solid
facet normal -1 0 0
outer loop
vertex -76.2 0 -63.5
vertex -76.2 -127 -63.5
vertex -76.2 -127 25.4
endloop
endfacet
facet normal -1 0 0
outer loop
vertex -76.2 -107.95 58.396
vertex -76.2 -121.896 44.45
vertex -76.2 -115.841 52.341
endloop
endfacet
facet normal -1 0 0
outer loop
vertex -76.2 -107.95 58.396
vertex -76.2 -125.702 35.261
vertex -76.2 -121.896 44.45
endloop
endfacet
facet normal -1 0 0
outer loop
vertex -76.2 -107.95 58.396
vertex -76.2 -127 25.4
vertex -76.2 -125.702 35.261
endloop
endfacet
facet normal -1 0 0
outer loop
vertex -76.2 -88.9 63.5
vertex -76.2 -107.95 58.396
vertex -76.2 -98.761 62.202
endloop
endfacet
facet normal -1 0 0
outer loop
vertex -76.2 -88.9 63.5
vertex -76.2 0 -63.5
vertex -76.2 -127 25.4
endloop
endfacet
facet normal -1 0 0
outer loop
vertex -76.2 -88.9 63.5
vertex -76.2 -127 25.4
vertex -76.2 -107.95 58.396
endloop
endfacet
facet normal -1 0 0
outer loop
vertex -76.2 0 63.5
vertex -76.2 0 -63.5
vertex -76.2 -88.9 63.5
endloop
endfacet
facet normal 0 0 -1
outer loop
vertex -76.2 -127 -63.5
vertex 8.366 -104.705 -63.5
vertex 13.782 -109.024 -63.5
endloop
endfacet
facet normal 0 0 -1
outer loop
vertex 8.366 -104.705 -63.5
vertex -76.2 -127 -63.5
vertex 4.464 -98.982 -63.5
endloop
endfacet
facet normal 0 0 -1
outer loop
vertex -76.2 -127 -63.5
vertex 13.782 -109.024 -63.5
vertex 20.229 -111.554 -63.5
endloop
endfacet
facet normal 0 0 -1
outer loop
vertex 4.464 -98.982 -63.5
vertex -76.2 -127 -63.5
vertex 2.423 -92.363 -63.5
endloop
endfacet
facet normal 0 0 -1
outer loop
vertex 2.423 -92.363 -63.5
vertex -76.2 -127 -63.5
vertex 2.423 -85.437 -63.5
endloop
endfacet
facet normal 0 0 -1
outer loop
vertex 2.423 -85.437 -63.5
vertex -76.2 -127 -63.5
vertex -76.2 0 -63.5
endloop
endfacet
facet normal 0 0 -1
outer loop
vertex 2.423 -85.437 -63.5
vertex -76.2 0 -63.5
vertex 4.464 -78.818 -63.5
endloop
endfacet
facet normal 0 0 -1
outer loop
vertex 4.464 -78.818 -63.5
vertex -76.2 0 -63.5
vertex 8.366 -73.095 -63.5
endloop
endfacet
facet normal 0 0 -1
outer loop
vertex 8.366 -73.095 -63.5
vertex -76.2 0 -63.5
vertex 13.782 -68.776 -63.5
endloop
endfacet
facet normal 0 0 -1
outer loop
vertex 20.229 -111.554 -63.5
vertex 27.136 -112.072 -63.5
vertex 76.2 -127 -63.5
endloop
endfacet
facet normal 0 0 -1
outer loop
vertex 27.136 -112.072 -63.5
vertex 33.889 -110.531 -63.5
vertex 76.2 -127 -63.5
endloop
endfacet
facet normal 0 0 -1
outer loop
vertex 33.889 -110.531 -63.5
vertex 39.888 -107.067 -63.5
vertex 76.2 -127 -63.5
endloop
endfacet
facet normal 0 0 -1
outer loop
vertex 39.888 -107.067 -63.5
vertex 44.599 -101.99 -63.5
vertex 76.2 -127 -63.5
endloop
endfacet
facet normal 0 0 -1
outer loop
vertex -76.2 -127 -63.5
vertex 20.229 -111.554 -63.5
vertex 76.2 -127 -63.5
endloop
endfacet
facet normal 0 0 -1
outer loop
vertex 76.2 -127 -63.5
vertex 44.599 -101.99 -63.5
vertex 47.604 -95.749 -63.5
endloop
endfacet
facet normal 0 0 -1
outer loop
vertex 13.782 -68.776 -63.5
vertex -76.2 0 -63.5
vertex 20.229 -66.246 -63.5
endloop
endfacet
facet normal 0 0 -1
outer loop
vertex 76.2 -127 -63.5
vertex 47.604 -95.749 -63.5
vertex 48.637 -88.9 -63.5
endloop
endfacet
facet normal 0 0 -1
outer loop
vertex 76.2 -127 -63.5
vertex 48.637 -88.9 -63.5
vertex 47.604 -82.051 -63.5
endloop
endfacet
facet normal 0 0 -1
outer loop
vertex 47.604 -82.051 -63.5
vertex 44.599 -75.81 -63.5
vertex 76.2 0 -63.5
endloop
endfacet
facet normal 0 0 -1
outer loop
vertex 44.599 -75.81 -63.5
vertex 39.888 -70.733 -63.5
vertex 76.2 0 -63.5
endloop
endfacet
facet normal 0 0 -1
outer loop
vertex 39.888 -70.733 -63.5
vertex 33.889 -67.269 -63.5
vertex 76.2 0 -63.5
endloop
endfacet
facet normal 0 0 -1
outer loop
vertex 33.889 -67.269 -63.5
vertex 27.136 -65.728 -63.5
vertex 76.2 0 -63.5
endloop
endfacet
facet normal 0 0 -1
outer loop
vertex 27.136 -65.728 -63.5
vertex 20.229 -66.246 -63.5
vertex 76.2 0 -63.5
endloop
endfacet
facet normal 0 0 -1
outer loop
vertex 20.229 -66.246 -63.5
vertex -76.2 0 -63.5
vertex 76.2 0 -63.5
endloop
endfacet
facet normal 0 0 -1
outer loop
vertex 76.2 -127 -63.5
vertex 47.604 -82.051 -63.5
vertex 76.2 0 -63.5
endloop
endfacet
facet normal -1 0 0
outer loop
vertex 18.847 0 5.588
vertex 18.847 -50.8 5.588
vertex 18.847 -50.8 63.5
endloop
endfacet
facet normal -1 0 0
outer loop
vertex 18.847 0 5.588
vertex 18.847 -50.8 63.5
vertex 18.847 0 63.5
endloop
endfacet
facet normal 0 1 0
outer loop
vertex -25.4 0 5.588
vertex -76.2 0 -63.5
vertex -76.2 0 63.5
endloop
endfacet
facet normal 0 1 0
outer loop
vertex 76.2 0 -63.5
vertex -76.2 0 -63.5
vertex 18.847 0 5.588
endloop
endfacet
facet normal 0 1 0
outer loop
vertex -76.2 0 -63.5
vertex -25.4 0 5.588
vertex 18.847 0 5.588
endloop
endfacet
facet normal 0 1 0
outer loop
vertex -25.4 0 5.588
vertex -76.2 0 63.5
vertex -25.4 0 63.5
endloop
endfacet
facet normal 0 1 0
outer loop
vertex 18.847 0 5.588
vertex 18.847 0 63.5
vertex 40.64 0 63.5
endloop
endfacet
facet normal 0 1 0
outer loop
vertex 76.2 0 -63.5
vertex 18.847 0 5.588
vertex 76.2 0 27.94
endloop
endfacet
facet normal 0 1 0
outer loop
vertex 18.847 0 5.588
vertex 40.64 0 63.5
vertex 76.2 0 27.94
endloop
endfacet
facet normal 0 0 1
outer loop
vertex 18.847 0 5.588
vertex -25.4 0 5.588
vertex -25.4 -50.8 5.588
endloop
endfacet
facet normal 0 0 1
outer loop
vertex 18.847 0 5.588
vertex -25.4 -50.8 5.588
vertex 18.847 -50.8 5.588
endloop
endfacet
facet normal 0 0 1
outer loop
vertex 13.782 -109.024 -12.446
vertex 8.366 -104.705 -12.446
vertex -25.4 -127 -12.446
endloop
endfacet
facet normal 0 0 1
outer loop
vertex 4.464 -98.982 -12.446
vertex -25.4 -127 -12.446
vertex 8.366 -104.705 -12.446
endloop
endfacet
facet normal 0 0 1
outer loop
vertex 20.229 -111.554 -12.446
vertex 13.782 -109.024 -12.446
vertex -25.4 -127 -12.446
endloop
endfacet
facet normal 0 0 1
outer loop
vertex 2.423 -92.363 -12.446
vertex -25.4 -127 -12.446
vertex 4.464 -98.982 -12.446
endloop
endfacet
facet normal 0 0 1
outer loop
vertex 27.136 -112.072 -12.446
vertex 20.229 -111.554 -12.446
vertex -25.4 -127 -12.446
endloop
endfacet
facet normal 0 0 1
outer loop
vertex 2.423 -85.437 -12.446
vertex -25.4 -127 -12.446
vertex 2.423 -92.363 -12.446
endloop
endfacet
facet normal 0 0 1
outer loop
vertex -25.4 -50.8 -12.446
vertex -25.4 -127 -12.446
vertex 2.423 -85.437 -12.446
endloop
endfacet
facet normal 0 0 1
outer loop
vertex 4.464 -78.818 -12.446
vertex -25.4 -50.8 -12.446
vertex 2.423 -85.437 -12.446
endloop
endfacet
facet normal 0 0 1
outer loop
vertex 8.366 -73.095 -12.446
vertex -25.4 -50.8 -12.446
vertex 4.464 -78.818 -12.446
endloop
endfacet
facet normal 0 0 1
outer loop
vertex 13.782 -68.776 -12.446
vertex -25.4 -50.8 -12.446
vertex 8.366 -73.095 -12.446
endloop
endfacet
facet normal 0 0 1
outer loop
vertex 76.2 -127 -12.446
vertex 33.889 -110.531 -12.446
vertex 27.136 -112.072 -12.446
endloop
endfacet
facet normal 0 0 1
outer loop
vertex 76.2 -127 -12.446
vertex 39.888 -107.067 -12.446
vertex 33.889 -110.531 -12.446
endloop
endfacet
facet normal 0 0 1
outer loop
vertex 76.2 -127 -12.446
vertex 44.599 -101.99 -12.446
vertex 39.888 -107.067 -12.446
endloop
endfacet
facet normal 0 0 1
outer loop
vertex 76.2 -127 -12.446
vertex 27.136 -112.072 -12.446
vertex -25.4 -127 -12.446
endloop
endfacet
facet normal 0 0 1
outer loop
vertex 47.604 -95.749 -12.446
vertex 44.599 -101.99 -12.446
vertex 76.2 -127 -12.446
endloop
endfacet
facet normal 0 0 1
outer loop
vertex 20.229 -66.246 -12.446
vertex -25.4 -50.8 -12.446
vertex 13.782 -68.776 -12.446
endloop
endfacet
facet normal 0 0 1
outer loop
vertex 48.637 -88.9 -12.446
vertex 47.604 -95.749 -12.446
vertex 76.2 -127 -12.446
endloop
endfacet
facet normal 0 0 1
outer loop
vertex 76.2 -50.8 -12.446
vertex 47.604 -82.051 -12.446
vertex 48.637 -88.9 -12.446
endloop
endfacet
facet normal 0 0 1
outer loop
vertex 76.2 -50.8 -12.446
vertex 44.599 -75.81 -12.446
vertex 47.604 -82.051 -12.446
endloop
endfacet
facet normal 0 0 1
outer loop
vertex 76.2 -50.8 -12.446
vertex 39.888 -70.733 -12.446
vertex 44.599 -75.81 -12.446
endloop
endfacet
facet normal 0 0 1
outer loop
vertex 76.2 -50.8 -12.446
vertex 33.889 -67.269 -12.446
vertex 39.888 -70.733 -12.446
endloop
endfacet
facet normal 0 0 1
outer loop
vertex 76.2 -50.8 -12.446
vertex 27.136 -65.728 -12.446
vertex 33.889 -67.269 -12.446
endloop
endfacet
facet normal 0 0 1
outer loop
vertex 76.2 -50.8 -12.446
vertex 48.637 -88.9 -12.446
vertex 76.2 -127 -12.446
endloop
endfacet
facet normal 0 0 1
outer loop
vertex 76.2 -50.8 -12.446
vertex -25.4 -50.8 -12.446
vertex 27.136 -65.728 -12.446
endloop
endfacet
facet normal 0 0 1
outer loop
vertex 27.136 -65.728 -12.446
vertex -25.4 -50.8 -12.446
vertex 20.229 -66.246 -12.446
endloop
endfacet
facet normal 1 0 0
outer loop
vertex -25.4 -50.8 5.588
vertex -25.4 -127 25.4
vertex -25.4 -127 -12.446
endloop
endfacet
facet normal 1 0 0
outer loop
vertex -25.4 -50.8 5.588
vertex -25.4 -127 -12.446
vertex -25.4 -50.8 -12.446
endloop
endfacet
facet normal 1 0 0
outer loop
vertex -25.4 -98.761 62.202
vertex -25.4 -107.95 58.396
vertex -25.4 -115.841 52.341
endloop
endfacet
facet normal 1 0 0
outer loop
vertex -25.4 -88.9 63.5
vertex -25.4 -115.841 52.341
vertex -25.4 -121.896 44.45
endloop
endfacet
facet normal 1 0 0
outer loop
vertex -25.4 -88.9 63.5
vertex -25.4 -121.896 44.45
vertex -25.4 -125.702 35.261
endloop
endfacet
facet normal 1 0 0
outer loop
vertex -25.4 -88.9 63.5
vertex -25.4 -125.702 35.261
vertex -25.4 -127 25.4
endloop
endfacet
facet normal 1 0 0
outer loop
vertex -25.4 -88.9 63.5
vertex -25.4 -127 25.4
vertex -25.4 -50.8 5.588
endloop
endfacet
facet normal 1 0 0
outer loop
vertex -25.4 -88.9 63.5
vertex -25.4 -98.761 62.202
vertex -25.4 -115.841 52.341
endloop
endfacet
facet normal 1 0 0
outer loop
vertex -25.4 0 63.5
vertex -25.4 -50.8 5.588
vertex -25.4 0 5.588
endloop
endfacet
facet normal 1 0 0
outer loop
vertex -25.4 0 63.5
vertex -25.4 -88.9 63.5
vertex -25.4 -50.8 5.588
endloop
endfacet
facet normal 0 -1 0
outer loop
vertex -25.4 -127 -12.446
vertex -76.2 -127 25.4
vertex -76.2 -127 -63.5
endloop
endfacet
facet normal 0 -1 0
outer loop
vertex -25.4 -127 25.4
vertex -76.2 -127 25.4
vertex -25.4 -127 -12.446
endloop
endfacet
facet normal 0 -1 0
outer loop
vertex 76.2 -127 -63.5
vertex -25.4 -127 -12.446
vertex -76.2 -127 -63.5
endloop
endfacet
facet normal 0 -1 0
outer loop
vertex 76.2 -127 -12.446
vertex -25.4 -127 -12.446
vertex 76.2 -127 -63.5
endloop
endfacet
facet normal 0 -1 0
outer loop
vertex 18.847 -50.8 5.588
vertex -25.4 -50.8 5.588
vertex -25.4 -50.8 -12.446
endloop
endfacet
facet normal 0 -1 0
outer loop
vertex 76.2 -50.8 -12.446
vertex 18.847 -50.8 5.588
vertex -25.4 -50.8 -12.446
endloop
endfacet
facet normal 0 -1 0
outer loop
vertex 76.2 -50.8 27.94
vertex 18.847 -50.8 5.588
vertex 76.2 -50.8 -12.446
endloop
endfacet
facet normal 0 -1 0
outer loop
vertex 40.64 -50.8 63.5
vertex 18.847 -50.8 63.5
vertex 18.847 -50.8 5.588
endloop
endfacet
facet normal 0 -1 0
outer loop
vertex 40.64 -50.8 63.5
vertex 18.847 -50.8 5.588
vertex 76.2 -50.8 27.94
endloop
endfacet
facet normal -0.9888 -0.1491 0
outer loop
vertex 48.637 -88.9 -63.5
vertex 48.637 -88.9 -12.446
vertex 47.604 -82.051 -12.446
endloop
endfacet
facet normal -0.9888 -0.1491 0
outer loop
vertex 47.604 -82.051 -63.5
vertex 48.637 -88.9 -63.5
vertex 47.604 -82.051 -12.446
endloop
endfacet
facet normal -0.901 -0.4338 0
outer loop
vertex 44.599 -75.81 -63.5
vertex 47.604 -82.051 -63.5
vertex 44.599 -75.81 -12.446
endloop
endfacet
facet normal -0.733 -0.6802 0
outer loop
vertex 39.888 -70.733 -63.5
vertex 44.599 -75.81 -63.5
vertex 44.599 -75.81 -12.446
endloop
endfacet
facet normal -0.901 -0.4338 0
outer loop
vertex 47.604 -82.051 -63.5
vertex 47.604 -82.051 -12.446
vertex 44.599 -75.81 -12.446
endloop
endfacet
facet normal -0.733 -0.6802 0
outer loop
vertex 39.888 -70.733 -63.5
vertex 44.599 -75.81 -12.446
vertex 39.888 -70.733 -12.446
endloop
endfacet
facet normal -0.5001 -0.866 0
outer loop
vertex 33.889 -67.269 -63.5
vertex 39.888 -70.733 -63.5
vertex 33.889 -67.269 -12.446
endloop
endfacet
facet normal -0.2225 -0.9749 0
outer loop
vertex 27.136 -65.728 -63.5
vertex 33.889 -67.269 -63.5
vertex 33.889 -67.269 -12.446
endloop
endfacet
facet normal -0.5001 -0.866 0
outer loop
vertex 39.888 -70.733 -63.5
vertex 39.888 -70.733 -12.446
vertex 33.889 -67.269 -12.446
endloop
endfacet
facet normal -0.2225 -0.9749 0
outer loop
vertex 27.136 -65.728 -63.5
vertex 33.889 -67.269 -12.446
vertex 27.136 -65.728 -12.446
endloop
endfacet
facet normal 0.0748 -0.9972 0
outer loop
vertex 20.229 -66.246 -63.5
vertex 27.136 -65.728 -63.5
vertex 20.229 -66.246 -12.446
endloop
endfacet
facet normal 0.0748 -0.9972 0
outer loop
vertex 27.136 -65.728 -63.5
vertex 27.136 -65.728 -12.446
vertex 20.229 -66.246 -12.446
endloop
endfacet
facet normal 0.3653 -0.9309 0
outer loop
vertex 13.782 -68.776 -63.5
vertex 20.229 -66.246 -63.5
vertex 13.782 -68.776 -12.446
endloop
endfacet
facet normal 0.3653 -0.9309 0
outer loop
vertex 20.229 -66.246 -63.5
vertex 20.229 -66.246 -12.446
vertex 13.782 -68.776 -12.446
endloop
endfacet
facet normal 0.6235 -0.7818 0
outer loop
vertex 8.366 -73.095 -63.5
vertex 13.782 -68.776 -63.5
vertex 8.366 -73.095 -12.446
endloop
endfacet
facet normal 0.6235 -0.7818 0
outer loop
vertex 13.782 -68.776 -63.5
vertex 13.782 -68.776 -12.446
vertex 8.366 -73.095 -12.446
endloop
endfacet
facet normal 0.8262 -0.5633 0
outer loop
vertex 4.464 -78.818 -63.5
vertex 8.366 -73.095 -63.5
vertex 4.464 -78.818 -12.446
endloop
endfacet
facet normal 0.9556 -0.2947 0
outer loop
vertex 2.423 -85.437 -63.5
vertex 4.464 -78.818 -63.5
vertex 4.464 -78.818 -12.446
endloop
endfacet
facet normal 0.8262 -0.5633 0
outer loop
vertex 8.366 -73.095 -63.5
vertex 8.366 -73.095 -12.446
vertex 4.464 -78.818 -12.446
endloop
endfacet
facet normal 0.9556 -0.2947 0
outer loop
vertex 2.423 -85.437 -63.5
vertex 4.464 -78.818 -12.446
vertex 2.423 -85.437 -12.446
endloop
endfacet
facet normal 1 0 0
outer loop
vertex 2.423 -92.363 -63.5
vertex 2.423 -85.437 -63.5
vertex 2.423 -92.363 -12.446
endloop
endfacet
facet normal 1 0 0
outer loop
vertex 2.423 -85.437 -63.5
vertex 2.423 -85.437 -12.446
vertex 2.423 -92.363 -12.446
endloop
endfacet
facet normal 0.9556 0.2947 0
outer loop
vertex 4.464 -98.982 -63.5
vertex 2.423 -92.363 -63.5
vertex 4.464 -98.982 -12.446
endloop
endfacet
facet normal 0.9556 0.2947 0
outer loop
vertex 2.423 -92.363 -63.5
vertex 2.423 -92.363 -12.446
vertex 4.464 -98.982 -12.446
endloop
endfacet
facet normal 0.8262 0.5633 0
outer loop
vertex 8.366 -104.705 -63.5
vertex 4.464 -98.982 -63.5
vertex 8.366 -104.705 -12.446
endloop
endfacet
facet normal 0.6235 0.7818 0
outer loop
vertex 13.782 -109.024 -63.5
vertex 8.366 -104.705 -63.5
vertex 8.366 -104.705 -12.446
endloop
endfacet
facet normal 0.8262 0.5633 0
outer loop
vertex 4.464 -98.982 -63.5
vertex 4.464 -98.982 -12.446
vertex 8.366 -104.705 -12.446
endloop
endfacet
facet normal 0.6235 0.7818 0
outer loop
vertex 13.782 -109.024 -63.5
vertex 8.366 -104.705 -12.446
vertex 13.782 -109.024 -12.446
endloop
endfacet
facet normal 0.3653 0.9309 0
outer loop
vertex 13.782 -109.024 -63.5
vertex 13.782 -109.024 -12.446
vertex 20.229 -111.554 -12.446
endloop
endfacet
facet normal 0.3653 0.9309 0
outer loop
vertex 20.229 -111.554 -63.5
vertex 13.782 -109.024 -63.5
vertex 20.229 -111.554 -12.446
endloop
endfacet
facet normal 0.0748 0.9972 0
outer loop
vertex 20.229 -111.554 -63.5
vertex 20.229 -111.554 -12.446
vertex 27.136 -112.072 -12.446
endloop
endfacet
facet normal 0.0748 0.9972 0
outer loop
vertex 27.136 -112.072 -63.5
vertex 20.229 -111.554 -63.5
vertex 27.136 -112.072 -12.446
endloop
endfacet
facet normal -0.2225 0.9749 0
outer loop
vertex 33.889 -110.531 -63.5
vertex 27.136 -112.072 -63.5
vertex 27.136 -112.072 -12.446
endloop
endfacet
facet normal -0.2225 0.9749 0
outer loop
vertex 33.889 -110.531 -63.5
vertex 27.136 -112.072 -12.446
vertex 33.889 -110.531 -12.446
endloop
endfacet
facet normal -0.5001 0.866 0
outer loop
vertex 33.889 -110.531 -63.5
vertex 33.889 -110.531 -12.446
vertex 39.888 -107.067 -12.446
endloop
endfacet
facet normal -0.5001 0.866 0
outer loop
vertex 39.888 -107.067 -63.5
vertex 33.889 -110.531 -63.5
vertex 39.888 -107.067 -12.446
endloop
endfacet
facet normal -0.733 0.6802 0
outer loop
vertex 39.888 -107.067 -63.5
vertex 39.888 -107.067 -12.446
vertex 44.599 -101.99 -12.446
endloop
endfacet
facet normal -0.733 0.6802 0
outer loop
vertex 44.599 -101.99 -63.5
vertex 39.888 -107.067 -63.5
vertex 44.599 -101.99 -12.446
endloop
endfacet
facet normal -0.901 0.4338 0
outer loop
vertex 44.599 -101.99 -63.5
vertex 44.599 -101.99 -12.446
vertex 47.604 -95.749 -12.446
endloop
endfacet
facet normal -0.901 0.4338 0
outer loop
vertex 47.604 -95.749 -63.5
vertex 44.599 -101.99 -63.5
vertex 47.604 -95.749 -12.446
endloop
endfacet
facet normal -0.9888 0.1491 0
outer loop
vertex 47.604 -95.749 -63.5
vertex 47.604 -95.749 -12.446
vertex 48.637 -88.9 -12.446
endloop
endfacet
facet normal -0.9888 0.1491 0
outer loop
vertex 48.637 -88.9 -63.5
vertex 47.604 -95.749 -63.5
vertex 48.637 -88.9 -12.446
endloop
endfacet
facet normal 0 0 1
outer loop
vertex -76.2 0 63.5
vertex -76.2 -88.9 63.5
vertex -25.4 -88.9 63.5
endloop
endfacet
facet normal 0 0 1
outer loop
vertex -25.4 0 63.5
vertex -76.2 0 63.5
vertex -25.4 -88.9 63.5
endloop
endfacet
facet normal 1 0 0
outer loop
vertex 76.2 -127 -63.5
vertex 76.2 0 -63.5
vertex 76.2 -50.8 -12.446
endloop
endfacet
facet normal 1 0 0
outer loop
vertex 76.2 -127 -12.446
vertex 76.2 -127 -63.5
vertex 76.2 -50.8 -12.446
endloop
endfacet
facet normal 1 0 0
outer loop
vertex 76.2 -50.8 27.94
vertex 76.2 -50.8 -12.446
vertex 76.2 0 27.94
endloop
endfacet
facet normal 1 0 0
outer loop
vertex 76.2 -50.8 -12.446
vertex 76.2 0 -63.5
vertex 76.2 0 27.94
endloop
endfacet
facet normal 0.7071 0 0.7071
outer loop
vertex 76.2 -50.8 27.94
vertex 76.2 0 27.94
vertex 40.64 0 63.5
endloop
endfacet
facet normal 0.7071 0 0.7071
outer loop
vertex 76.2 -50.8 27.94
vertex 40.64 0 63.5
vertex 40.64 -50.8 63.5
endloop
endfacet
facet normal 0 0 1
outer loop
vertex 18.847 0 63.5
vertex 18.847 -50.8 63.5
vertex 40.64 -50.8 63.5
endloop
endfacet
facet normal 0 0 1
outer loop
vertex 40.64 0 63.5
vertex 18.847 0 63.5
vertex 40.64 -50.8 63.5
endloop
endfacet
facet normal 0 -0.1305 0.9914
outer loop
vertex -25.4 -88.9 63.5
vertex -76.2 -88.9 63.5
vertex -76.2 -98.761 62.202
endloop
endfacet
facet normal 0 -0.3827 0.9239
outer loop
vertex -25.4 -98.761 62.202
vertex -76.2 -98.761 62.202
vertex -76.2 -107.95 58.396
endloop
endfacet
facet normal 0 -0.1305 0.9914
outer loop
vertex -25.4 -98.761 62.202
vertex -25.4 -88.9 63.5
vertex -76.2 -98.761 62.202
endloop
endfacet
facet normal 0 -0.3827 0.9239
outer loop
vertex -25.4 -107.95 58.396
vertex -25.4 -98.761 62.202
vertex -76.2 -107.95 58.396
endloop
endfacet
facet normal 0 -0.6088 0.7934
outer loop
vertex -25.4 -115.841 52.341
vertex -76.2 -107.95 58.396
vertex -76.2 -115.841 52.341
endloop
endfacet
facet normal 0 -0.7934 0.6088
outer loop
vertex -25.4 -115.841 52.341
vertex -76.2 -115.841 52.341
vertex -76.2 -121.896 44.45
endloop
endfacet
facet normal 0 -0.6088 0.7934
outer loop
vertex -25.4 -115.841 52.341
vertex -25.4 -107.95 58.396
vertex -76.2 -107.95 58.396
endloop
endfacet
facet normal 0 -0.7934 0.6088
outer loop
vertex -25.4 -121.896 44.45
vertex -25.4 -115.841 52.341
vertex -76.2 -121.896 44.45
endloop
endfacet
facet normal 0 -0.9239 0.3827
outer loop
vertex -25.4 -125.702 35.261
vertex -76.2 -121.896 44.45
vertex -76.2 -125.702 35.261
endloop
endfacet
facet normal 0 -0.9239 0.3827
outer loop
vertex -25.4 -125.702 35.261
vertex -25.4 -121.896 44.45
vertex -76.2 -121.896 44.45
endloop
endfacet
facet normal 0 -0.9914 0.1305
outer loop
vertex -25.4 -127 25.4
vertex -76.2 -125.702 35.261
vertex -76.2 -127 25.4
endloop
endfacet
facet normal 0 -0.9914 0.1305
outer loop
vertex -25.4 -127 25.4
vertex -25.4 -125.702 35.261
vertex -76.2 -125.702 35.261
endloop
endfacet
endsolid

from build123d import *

# Parameters (mm, degrees)
F0_W     = 152.4
F0_H     = 127
F1_DEPTH = 127
F2_W     = 101.6
F2_H     = 76.2
F3_DEPTH = 75.946
F4_R     = 23.2368410965
F5_DEPTH = 177.8
F6_R     = 38.1
F7_SIZE  = 35.56
F8_W     = 44.2467968255
F8_H     = 50.8
F9_DEPTH = 57.912


# Not quite as in the source:
# - a feature names something its author has since deleted; it is built from what else it names


with BuildPart() as f1:
    # F0 (on Front) → F1 (new body)
    with BuildSketch(Plane.XZ):
        Rectangle(F0_W, F0_H)
    extrude(amount=F1_DEPTH)

    # F2 (on face) → F3 (cut)
    with BuildSketch(Plane.XY.offset(63.5)):
        with Locations((25.4, -88.9)):
            Rectangle(F2_W, F2_H)
    extrude(amount=-F3_DEPTH, mode=Mode.SUBTRACT)

    # F4 (on face) → F5 (cut)
    with BuildSketch(Plane.XY.offset(-12.446)):
        with Locations((25.4, -88.9)):
            Circle(F4_R)
    extrude(amount=-F5_DEPTH, mode=Mode.SUBTRACT)

    # F6
    f6_edges = [f1.edges().sort_by_distance(p)[0] for p in [
        (-50.8, -127, 63.5),
    ]]
    fillet(f6_edges, radius=F6_R)

    # F7
    f7_edges = [f1.edges().sort_by_distance(p)[0] for p in [
        (76.2, -25.4, 63.5),
    ]]
    chamfer(f7_edges, length=F7_SIZE)

    # F8 (on face) → F9 (cut)
    with BuildSketch(Plane.XY.offset(63.5)):
        with Locations((-3.2766015872, -25.4)):
            Rectangle(F8_W, F8_H)
    extrude(amount=-F9_DEPTH, mode=Mode.SUBTRACT)


solid = f1.part
